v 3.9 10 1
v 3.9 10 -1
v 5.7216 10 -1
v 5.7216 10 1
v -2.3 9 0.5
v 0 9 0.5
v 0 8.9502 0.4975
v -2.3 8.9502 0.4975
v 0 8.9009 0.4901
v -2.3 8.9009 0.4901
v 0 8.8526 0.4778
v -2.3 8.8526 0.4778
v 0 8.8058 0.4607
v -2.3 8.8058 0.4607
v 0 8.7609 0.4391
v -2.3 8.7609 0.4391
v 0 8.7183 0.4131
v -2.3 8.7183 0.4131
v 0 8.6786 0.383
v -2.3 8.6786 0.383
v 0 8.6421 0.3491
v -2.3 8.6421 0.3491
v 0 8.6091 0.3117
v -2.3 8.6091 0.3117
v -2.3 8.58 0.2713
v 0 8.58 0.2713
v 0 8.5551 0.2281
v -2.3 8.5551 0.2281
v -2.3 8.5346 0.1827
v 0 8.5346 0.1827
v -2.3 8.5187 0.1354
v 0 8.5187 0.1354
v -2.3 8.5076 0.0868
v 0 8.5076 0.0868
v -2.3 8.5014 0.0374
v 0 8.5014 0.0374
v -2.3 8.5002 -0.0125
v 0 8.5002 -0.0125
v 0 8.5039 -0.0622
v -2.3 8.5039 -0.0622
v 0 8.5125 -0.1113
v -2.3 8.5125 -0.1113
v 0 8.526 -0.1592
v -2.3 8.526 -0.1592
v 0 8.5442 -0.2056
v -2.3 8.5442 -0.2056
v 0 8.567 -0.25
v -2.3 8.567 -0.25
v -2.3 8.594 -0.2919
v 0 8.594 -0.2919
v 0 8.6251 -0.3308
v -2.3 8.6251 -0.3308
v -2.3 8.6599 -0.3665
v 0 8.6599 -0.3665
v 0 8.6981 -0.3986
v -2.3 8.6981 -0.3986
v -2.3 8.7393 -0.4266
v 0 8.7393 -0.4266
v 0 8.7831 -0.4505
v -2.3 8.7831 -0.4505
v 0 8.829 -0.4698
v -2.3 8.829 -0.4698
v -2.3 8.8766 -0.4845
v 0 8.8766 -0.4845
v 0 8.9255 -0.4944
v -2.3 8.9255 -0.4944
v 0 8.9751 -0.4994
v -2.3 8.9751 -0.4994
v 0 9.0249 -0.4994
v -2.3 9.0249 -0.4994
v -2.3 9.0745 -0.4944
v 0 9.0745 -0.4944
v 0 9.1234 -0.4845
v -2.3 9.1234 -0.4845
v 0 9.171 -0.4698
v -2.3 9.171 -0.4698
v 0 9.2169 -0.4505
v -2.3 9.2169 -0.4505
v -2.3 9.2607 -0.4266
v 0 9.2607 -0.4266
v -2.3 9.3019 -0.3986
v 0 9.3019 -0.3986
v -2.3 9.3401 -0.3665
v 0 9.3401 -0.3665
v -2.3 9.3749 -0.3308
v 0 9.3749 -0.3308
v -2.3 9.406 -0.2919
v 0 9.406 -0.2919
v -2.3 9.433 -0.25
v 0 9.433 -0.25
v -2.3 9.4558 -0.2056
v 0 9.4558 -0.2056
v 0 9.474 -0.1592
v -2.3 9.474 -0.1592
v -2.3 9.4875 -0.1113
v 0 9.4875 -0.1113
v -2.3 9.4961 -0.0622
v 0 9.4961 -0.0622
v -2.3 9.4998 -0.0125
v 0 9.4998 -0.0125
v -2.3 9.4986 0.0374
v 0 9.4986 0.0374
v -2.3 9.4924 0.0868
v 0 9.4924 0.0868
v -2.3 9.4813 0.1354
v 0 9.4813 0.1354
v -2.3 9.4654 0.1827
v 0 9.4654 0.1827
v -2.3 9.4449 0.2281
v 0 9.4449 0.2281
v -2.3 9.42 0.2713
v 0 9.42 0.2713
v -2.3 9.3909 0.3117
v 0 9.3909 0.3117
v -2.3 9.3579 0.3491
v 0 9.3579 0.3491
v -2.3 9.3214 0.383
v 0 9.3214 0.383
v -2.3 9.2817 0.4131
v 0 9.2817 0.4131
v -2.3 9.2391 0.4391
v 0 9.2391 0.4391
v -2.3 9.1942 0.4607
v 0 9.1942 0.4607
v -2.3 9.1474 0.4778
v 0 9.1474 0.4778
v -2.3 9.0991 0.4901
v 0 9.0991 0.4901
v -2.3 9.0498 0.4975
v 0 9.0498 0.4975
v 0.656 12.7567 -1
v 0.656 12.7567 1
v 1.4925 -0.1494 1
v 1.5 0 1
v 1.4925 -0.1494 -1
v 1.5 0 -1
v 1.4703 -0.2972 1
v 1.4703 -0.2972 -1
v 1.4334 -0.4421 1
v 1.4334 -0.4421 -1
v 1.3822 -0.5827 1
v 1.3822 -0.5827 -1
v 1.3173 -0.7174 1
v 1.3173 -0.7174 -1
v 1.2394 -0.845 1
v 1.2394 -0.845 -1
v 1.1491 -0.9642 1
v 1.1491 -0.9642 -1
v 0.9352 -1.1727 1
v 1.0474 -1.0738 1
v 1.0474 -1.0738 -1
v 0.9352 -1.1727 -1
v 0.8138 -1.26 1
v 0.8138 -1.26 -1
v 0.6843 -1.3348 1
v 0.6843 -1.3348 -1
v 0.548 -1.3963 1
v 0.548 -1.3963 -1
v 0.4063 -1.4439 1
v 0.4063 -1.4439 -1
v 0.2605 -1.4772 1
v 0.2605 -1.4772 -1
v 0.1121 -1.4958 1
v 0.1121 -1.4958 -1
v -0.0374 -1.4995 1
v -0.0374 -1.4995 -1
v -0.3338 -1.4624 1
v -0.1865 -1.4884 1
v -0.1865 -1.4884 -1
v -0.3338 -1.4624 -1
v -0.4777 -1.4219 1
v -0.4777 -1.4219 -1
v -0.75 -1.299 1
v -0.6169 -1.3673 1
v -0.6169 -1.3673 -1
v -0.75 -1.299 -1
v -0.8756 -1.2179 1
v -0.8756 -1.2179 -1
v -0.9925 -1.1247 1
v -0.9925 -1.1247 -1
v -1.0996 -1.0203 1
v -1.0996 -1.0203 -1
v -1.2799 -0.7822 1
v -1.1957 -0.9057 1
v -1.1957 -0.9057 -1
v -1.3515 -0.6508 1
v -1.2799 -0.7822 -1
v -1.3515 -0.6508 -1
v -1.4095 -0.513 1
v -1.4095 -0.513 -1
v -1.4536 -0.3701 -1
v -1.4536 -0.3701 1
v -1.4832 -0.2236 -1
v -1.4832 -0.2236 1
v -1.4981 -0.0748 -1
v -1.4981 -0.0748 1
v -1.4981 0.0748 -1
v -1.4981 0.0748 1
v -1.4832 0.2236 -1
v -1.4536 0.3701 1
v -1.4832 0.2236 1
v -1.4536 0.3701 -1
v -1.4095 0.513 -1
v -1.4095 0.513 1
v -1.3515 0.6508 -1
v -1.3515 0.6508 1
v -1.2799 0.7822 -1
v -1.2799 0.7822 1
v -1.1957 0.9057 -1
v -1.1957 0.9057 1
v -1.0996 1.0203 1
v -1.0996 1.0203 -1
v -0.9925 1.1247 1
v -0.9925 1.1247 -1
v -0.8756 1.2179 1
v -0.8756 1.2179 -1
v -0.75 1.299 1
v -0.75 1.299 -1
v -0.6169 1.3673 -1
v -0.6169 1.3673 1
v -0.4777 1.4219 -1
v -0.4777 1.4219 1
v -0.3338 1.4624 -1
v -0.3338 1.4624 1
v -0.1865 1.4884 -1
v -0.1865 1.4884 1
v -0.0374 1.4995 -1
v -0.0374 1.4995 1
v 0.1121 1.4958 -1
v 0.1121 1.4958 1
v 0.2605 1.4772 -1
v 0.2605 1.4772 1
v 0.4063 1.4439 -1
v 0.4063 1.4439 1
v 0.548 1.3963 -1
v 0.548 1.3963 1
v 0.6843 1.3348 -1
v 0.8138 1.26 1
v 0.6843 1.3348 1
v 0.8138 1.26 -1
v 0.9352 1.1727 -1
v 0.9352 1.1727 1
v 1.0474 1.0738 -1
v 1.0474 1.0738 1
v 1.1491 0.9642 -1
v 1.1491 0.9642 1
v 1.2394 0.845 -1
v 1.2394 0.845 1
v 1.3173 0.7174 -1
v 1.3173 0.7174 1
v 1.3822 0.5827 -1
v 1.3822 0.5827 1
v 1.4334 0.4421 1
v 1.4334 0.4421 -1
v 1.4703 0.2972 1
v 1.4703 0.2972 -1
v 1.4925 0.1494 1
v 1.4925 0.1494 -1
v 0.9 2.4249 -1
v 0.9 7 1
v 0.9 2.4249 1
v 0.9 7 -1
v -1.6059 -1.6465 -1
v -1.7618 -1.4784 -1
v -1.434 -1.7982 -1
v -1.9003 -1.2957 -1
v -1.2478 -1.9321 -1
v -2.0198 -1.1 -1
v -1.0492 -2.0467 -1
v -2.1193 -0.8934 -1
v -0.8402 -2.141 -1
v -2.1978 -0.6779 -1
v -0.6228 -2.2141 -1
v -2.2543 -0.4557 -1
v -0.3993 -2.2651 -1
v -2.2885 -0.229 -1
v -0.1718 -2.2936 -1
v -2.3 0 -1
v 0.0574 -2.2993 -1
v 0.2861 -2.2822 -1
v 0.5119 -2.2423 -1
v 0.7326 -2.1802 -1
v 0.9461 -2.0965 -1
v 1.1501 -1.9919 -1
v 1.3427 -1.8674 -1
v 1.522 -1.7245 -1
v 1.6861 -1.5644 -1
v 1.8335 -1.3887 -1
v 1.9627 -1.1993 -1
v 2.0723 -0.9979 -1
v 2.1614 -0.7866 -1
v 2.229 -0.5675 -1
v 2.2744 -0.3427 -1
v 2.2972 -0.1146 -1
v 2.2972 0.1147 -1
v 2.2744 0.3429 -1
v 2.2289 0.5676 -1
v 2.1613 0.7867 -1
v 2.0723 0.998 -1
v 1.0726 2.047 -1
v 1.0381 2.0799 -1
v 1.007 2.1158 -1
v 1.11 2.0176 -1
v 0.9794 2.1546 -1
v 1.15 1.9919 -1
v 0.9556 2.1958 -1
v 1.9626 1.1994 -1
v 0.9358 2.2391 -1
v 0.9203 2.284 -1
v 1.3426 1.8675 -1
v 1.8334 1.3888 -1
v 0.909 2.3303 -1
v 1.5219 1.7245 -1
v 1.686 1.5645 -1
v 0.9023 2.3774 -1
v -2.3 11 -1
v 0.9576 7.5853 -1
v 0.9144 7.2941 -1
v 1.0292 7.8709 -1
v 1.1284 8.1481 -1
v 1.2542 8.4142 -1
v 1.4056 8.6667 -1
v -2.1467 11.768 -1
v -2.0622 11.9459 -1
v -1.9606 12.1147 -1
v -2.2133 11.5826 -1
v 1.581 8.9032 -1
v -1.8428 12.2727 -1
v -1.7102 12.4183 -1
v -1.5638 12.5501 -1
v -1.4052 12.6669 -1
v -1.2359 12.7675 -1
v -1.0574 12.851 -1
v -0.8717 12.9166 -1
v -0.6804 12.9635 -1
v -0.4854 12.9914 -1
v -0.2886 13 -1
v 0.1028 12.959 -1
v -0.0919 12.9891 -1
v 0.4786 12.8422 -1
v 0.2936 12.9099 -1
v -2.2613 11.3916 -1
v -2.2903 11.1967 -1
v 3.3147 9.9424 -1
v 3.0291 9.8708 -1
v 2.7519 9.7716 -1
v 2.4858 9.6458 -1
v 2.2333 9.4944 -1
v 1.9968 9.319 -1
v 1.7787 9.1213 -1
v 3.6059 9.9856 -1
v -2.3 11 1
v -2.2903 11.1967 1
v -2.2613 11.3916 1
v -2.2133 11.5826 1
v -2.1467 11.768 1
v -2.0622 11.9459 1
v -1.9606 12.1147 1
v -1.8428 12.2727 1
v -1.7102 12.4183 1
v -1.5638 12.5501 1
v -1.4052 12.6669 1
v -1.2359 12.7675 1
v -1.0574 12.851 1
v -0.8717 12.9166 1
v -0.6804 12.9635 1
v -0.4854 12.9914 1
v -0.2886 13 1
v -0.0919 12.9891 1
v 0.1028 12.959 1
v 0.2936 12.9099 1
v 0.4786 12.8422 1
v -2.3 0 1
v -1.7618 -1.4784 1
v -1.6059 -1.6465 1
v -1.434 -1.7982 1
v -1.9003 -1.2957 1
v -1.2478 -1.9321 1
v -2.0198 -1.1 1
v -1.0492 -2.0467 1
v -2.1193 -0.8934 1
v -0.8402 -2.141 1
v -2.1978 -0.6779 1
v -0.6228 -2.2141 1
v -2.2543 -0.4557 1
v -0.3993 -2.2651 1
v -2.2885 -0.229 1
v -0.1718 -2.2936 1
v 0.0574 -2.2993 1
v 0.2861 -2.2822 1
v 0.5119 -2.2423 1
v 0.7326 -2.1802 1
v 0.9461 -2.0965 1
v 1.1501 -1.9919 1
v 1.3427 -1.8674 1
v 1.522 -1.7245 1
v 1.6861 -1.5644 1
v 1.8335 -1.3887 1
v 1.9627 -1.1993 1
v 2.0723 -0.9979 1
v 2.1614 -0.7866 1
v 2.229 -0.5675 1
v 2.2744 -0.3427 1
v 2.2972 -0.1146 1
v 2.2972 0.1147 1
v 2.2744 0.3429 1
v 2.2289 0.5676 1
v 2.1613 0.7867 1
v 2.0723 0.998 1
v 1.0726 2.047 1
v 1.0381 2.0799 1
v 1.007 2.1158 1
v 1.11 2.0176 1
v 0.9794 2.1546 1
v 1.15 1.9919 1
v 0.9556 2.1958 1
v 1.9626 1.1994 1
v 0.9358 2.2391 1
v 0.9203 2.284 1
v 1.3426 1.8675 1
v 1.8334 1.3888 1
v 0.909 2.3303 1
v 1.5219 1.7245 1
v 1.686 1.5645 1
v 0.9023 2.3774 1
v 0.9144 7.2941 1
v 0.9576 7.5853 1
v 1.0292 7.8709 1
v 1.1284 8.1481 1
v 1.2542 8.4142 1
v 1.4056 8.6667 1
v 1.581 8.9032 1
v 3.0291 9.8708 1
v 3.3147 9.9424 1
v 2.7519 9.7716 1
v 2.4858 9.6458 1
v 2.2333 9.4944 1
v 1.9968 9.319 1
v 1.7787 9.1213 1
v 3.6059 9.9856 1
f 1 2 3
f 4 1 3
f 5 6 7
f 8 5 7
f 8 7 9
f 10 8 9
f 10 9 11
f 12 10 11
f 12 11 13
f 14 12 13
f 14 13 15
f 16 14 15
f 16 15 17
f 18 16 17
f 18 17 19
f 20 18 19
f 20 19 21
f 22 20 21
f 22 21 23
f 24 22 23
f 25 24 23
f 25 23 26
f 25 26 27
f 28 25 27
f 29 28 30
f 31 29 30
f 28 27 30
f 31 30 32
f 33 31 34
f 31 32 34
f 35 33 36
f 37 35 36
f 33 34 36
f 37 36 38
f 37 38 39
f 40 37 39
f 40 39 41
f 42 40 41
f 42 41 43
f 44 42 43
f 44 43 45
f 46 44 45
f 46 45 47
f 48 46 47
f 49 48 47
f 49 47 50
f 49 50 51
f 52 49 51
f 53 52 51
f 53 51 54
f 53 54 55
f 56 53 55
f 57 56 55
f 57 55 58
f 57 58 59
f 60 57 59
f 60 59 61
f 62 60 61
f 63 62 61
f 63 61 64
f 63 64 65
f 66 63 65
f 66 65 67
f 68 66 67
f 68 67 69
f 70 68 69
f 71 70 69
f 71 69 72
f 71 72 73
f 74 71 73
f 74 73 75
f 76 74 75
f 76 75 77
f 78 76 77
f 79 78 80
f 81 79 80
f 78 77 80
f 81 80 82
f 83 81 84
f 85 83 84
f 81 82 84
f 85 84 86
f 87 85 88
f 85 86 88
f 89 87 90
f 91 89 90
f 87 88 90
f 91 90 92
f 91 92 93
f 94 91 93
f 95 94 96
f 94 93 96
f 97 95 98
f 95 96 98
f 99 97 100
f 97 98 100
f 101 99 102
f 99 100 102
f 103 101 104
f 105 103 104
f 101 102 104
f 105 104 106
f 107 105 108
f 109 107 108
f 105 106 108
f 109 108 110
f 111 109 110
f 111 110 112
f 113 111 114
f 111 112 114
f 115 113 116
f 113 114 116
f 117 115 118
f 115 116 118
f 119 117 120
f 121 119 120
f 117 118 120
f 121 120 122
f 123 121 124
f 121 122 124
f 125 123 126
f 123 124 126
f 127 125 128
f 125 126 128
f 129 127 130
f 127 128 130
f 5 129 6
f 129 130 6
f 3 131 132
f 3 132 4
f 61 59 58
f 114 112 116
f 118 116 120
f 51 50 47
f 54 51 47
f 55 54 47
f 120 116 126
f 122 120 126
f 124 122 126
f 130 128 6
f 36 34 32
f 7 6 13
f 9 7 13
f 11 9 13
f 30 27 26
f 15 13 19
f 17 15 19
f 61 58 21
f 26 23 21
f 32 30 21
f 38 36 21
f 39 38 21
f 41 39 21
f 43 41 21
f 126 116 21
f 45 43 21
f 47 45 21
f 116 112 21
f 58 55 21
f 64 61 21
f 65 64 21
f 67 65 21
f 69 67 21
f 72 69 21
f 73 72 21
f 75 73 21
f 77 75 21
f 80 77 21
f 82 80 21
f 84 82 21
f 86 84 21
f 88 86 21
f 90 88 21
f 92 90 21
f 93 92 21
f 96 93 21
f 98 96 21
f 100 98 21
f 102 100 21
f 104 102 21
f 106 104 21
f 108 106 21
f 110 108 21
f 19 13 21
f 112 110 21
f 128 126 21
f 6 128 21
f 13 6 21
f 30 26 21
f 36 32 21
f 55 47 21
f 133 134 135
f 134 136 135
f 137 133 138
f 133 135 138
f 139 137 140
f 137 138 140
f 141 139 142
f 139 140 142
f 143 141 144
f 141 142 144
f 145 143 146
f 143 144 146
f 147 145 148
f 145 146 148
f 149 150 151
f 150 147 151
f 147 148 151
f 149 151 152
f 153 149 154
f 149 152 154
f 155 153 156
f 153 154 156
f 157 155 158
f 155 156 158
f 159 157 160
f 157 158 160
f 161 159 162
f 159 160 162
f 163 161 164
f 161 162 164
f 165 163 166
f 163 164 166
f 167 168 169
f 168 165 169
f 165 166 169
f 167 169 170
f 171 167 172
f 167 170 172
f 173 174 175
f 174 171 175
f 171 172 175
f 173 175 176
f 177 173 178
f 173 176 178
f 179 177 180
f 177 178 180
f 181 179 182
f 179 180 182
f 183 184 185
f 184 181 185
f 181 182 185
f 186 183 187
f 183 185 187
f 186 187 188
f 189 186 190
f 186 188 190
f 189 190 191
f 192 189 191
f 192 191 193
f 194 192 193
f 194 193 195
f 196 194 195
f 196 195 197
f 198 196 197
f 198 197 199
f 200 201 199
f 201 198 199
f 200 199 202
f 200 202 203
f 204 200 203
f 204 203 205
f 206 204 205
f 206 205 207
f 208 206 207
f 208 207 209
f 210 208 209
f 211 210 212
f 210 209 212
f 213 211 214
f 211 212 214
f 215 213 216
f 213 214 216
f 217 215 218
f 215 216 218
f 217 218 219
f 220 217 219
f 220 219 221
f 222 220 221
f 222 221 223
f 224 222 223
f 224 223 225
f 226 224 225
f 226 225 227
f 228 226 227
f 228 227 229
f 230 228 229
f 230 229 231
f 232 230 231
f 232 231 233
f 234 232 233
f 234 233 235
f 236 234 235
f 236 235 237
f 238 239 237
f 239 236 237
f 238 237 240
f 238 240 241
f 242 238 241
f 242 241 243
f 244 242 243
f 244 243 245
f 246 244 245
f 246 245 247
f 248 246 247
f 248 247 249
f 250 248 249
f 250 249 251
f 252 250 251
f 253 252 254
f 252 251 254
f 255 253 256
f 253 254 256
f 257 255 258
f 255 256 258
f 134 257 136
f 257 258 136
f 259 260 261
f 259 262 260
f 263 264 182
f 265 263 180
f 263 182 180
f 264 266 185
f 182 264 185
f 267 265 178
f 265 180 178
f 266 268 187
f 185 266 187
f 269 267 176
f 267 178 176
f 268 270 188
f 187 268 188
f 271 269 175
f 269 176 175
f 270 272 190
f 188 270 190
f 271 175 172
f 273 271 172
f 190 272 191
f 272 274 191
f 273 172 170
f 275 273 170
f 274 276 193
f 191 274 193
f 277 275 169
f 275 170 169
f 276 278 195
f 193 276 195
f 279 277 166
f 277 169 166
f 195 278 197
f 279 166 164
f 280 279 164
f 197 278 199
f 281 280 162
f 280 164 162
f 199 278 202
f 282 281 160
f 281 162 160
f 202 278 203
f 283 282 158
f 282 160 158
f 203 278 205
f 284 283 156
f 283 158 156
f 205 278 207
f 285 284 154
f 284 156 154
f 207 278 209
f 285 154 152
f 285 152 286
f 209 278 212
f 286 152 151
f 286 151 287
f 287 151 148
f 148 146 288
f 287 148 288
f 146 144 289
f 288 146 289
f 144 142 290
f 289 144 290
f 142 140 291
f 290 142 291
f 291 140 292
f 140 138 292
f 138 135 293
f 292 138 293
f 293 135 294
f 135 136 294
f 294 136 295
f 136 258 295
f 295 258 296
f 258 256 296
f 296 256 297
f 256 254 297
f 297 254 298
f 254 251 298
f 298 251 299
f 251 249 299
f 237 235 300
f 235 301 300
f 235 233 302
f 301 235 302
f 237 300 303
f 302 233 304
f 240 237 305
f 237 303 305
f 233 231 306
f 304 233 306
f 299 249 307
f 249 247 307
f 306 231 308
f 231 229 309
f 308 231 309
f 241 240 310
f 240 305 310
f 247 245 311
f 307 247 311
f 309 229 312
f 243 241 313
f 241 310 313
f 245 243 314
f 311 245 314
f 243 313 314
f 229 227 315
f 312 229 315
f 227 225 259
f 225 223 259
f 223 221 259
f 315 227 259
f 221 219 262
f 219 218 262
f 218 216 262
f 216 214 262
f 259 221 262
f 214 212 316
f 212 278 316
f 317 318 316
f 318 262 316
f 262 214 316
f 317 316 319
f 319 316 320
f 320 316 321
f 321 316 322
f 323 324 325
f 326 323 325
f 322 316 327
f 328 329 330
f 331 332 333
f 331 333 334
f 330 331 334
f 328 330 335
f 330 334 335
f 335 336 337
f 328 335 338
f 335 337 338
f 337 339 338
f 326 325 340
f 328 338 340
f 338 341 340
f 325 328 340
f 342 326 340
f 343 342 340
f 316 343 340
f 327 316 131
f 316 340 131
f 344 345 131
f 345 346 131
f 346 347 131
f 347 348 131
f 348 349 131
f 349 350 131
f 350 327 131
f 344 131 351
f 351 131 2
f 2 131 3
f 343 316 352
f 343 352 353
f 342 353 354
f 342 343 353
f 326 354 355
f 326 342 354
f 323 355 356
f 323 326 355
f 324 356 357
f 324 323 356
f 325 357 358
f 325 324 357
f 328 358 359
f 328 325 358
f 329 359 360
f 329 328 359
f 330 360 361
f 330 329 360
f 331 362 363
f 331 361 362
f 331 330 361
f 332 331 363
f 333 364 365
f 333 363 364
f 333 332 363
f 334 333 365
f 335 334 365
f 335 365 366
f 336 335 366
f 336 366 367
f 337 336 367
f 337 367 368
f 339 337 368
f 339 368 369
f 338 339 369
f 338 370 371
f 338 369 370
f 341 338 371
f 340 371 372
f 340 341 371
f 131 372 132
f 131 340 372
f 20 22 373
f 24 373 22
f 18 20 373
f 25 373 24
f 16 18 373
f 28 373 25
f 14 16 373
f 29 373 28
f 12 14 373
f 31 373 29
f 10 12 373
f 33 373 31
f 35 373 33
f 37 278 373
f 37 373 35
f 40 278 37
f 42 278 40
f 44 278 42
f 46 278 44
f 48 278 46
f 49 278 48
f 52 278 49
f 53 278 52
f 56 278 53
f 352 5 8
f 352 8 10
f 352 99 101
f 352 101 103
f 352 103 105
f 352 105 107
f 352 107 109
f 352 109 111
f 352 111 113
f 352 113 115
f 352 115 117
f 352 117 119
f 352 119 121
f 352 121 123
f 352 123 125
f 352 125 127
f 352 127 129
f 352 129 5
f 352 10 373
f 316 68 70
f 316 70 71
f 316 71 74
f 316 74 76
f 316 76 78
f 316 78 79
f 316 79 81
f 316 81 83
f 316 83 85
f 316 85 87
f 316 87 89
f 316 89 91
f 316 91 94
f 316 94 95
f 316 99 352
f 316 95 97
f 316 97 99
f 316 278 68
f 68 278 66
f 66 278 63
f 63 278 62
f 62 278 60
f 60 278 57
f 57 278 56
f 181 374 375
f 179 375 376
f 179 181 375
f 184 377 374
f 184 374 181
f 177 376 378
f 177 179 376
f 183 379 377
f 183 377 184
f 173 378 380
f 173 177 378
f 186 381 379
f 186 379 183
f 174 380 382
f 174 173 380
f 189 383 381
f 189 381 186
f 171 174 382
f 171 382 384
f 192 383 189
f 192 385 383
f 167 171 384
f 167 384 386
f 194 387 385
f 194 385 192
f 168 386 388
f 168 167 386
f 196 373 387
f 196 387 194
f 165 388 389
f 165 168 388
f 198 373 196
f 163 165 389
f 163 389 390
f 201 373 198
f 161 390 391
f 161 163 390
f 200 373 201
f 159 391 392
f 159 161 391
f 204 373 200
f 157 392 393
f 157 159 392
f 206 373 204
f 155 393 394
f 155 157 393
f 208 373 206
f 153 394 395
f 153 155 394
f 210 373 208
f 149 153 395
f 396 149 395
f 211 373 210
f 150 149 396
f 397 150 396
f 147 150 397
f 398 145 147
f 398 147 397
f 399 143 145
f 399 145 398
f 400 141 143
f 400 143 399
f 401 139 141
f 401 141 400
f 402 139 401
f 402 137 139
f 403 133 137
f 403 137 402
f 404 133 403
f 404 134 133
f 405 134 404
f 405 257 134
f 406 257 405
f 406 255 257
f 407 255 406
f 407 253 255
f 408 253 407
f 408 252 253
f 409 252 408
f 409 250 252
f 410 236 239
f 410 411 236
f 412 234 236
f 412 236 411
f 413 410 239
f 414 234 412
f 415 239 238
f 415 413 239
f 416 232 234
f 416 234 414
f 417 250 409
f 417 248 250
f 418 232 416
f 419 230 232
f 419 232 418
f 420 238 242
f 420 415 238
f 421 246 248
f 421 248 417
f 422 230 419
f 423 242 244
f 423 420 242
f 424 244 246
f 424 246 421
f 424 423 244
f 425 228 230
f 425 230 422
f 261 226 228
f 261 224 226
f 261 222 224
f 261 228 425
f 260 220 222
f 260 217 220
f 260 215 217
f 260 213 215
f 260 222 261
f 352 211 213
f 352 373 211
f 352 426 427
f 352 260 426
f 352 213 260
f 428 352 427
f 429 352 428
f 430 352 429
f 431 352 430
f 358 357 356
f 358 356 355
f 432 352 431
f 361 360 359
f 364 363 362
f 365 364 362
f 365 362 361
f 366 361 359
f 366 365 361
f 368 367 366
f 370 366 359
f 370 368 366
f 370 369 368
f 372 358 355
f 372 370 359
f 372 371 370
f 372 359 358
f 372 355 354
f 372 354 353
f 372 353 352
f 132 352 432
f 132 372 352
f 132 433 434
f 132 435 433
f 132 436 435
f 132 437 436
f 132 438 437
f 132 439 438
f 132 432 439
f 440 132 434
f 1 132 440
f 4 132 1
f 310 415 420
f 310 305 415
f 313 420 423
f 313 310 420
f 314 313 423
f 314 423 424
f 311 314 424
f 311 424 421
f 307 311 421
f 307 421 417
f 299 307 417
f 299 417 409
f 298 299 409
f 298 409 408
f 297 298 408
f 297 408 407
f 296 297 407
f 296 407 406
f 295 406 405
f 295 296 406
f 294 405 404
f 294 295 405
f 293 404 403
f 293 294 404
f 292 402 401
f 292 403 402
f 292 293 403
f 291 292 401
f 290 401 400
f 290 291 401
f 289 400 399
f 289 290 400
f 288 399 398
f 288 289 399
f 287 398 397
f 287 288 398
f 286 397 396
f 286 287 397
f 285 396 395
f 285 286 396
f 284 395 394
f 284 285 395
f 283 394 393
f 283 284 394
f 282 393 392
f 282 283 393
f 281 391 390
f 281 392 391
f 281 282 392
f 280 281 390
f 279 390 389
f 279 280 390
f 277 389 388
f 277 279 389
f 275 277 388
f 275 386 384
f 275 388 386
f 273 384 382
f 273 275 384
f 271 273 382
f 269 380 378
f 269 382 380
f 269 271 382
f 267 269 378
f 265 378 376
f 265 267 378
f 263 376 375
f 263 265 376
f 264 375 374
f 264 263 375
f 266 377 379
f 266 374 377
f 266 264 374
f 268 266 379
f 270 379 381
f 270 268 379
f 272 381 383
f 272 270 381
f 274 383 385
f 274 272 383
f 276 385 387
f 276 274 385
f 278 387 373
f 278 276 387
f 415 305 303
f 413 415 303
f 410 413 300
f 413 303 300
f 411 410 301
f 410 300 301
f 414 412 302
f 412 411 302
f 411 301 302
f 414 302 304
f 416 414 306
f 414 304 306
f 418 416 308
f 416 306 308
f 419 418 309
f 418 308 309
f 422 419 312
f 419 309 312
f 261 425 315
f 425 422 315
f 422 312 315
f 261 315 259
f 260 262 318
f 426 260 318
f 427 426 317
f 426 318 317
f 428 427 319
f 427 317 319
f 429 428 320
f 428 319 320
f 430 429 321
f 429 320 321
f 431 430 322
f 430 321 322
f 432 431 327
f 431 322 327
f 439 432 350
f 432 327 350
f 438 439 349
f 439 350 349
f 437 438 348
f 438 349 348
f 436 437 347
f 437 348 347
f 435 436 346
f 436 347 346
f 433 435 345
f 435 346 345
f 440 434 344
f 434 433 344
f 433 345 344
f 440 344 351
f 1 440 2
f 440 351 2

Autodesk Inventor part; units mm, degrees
ref_plane "YZ Plane" through (0, 0, 0) normal (1, 0, 0) x (0, 1, 0)
ref_plane "XZ Plane" through (0, 0, 0) normal (0, 1, 0) x (-1, 0, 0)
ref_plane "XY Plane" through (0, 0, 0) normal (0, 0, 1) x (1, 0, 0)
sketch "Boceto1" plane through (0, 0, 0) normal (0, 0, 1) x (1, 0, 0)
  circle A0 centre (0, 0) radius 1.5
  arc A1 (0, 2.3) -> (1.15, 1.9919) centre (0, 0) ccw
  line L0 (-2.3, 0) -> (-2.3, 11)
  line L1 (0, -2.3) -> (0, 17.0308) construction
  circle A2 centre (-0.3, 11) radius 2
  line L2 (0.9, 7) -> (0.9, 2.4249)
  line L3 (-6.6108, 0) -> (6.6108, 0) construction
  arc A3 (3.9, 10) -> (0.9, 7) centre (3.9, 7) ccw
  line L4 (-2.4885, 11) -> (5.8935, 11) construction
  line L5 (0.8529, 10) -> (0.9, 10)
  line L6 (3.9, 10) -> (5.7216, 10)
  line L7 (0.656, 12.7567) -> (5.7248, 9.9983)
  arc A4 (0.9, 2.4249) -> (1.15, 1.9919) centre (1.4, 2.4249) ccw
  point P0 (0.9, 2.1166)
  dimension "d3" = 4
  dimension "d0" = 2.3
  dimension "d1" = 3
  dimension "d2" = 11
  dimension "d5" = 3.2
  dimension "d6" = 6
  dimension "d7" = 11
  dimension "d9" = 10
  dimension "d21" = 1
extrude "Extrusión1" add sketch "Boceto1" along normal mid plane 2
sketch "Boceto2" plane through (-2.3, 0, 1) normal (-1, 0, 0) x (0, 0, 1)
  line L0 (-1, 0) -> (-1, 11) construction
  line L1 (-2, 11) -> (0, 11) projected
  line L2 (-2, 0) -> (0, 0) projected
  line L3 (0, 11) -> (0, 0) projected
  line L4 (-2, 11) -> (0, 11) projected
  line L5 (-2, 0) -> (-2, 11) projected
  circle A0 centre (-1, 9) radius 0.5
  dimension "d12" = 1
  dimension "d13" = 9
hole "Agujero1" at (-2.3, 9, 0) direction (1, 0, 0) diameter 1 depth 2.3
properties part number "Hudson 1-62D"
